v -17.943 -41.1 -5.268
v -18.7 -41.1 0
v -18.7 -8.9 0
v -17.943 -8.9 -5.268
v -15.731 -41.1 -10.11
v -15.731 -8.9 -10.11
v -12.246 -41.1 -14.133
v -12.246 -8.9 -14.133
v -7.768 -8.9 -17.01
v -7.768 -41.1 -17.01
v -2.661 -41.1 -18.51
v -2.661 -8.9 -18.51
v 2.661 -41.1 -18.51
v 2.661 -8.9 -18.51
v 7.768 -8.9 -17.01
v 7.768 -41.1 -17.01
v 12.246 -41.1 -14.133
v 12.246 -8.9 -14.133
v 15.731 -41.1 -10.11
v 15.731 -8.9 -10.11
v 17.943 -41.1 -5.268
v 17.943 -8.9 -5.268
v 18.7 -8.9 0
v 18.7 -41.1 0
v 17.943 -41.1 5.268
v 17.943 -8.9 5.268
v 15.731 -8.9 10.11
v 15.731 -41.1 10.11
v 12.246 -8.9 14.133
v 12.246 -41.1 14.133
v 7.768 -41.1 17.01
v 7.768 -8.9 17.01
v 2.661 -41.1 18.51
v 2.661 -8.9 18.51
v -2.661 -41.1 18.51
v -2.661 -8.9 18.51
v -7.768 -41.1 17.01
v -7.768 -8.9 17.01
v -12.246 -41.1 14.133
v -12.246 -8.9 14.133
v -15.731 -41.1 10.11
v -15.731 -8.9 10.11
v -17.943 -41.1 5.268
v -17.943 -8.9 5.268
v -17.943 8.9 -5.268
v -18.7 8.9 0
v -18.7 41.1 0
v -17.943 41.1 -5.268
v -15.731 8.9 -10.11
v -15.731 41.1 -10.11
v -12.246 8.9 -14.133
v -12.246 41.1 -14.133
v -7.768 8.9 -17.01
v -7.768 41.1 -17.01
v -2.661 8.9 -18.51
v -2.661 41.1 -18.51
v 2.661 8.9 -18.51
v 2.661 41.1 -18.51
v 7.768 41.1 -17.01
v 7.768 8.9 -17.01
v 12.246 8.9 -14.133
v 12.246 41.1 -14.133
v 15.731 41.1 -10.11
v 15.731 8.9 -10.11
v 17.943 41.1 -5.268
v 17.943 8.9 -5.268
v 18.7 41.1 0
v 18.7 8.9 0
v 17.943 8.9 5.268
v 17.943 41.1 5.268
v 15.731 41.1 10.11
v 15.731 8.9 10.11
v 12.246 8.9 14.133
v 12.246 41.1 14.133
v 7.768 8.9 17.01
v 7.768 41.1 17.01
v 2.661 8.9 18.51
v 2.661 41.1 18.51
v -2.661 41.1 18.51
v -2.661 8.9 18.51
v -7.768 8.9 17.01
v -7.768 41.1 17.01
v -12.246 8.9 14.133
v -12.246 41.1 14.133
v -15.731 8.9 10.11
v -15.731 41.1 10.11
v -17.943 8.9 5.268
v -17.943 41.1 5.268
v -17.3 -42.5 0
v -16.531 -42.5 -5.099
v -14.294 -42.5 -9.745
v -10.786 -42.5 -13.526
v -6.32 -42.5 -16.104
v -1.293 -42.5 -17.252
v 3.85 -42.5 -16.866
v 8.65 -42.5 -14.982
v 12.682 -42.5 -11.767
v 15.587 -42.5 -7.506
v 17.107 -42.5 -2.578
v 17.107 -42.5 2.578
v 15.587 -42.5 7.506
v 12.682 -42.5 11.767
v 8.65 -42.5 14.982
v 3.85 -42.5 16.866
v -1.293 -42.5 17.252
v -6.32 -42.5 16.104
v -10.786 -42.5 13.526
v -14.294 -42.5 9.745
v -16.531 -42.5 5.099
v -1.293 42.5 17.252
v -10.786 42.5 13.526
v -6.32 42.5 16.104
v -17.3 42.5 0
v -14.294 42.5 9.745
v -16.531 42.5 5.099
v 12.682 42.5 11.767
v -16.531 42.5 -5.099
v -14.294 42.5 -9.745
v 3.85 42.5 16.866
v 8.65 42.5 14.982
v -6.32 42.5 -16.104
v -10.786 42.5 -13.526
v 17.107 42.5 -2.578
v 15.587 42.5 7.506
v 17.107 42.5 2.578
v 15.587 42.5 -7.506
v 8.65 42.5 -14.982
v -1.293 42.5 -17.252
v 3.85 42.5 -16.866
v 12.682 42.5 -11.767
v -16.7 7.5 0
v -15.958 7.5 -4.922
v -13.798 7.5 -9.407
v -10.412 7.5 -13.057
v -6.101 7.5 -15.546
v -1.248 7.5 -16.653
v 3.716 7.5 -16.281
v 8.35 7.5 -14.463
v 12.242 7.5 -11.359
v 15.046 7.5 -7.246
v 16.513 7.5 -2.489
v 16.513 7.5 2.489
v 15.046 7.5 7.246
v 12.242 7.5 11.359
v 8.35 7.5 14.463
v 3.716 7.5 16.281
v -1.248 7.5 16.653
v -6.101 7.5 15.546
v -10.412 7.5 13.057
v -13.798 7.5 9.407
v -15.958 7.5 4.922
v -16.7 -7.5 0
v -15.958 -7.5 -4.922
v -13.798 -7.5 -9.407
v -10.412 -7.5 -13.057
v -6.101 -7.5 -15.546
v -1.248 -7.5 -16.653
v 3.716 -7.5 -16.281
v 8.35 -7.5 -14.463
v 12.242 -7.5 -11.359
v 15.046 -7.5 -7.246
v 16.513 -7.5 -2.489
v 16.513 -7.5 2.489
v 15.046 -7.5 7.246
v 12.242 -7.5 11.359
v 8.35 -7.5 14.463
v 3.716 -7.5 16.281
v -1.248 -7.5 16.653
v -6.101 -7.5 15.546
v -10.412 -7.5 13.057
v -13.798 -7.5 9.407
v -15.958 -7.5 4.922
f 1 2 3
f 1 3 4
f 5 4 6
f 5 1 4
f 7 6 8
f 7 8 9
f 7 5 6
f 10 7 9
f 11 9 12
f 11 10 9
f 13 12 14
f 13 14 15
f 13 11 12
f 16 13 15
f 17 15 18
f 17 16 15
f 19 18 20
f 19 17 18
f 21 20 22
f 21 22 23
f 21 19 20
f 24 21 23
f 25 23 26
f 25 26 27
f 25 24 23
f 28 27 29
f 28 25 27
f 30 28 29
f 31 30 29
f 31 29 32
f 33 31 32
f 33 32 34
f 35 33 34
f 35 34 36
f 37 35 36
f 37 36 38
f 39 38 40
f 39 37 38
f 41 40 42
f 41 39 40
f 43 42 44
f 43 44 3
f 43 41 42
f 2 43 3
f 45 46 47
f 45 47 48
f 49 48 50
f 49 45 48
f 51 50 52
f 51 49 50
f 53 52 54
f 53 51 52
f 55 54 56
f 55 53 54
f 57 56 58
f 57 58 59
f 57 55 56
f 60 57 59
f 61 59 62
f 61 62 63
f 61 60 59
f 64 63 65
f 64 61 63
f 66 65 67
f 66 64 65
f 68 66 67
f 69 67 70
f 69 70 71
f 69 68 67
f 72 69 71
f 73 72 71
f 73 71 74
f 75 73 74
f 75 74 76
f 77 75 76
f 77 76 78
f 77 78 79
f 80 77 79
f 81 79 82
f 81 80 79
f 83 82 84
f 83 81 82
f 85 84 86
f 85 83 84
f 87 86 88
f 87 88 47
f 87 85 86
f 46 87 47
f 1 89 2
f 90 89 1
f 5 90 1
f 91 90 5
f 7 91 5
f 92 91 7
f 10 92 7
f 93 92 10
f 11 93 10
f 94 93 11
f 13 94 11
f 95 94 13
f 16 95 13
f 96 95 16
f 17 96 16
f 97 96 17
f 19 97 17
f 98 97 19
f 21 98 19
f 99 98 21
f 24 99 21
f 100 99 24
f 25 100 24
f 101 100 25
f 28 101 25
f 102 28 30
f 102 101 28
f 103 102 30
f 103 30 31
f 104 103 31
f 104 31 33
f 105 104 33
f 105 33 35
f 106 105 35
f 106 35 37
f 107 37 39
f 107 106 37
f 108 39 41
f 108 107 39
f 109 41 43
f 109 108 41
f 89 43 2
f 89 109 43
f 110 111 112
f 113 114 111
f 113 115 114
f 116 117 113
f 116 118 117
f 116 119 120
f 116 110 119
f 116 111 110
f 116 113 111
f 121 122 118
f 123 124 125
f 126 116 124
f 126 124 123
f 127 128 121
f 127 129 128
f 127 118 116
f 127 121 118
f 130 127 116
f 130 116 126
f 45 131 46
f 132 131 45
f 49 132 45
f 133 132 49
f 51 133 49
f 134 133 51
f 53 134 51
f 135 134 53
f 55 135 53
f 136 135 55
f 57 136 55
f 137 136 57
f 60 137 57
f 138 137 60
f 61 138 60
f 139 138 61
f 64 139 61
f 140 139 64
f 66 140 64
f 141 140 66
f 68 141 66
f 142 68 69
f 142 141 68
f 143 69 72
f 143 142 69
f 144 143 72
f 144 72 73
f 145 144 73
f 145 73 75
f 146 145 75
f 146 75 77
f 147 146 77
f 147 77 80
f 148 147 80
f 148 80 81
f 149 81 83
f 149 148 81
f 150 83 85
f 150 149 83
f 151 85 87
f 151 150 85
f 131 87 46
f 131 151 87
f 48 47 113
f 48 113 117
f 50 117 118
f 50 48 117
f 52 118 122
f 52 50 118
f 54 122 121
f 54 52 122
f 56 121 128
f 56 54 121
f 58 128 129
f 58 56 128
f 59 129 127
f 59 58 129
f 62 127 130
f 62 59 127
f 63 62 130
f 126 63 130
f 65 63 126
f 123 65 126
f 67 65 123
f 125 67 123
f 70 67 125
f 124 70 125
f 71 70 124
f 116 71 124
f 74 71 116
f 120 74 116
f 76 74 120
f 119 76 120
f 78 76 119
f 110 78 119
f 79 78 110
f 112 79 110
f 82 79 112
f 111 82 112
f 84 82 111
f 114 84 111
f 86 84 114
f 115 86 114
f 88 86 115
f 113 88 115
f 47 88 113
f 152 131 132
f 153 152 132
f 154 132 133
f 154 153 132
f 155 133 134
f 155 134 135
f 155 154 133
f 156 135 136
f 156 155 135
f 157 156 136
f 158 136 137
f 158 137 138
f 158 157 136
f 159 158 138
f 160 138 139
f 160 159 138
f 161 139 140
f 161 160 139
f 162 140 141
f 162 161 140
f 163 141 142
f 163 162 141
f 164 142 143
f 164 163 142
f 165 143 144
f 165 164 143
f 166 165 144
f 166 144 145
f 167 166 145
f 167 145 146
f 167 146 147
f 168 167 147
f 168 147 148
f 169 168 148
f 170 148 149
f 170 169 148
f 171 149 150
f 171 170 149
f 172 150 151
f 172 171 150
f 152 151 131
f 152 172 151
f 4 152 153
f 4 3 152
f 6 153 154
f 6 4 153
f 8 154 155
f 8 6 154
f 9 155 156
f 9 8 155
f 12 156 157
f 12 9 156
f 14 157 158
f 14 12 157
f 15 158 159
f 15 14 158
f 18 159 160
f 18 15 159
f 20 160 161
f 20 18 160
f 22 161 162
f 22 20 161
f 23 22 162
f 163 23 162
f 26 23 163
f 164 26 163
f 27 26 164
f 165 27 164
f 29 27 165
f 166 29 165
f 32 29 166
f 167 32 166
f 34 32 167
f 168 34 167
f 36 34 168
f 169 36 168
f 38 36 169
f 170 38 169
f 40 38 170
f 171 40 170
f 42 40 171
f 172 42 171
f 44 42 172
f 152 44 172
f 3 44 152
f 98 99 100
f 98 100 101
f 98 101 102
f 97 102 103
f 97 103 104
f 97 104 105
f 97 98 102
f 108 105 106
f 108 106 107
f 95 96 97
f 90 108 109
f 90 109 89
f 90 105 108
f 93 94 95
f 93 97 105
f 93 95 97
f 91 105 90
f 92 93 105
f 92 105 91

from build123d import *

# Parameters (mm, degrees)
F2_SIZE = 1.4


with BuildPart() as f1:
    # F0 (on Top) → F1 (revolve)
    with BuildSketch(Plane.XY):
        Polygon((0, -42.5), (0, 42.5), (-18.7, 42.5), (-18.7, 8.900415), (-16.7, 7.5), (-16.7, -7.5), (-18.7, -8.900415), (-18.7, -42.5), align=None)
    revolve(axis=Axis((0, 0, 0), (0, -1, 0)))

    # F2
    f2_edges = [f1.edges().sort_by_distance(p)[0] for p in [
        (18.7, 42.5, 0),
        (18.7, -42.5, 0),
    ]]
    chamfer(f2_edges, length=F2_SIZE)


solid = f1.part
